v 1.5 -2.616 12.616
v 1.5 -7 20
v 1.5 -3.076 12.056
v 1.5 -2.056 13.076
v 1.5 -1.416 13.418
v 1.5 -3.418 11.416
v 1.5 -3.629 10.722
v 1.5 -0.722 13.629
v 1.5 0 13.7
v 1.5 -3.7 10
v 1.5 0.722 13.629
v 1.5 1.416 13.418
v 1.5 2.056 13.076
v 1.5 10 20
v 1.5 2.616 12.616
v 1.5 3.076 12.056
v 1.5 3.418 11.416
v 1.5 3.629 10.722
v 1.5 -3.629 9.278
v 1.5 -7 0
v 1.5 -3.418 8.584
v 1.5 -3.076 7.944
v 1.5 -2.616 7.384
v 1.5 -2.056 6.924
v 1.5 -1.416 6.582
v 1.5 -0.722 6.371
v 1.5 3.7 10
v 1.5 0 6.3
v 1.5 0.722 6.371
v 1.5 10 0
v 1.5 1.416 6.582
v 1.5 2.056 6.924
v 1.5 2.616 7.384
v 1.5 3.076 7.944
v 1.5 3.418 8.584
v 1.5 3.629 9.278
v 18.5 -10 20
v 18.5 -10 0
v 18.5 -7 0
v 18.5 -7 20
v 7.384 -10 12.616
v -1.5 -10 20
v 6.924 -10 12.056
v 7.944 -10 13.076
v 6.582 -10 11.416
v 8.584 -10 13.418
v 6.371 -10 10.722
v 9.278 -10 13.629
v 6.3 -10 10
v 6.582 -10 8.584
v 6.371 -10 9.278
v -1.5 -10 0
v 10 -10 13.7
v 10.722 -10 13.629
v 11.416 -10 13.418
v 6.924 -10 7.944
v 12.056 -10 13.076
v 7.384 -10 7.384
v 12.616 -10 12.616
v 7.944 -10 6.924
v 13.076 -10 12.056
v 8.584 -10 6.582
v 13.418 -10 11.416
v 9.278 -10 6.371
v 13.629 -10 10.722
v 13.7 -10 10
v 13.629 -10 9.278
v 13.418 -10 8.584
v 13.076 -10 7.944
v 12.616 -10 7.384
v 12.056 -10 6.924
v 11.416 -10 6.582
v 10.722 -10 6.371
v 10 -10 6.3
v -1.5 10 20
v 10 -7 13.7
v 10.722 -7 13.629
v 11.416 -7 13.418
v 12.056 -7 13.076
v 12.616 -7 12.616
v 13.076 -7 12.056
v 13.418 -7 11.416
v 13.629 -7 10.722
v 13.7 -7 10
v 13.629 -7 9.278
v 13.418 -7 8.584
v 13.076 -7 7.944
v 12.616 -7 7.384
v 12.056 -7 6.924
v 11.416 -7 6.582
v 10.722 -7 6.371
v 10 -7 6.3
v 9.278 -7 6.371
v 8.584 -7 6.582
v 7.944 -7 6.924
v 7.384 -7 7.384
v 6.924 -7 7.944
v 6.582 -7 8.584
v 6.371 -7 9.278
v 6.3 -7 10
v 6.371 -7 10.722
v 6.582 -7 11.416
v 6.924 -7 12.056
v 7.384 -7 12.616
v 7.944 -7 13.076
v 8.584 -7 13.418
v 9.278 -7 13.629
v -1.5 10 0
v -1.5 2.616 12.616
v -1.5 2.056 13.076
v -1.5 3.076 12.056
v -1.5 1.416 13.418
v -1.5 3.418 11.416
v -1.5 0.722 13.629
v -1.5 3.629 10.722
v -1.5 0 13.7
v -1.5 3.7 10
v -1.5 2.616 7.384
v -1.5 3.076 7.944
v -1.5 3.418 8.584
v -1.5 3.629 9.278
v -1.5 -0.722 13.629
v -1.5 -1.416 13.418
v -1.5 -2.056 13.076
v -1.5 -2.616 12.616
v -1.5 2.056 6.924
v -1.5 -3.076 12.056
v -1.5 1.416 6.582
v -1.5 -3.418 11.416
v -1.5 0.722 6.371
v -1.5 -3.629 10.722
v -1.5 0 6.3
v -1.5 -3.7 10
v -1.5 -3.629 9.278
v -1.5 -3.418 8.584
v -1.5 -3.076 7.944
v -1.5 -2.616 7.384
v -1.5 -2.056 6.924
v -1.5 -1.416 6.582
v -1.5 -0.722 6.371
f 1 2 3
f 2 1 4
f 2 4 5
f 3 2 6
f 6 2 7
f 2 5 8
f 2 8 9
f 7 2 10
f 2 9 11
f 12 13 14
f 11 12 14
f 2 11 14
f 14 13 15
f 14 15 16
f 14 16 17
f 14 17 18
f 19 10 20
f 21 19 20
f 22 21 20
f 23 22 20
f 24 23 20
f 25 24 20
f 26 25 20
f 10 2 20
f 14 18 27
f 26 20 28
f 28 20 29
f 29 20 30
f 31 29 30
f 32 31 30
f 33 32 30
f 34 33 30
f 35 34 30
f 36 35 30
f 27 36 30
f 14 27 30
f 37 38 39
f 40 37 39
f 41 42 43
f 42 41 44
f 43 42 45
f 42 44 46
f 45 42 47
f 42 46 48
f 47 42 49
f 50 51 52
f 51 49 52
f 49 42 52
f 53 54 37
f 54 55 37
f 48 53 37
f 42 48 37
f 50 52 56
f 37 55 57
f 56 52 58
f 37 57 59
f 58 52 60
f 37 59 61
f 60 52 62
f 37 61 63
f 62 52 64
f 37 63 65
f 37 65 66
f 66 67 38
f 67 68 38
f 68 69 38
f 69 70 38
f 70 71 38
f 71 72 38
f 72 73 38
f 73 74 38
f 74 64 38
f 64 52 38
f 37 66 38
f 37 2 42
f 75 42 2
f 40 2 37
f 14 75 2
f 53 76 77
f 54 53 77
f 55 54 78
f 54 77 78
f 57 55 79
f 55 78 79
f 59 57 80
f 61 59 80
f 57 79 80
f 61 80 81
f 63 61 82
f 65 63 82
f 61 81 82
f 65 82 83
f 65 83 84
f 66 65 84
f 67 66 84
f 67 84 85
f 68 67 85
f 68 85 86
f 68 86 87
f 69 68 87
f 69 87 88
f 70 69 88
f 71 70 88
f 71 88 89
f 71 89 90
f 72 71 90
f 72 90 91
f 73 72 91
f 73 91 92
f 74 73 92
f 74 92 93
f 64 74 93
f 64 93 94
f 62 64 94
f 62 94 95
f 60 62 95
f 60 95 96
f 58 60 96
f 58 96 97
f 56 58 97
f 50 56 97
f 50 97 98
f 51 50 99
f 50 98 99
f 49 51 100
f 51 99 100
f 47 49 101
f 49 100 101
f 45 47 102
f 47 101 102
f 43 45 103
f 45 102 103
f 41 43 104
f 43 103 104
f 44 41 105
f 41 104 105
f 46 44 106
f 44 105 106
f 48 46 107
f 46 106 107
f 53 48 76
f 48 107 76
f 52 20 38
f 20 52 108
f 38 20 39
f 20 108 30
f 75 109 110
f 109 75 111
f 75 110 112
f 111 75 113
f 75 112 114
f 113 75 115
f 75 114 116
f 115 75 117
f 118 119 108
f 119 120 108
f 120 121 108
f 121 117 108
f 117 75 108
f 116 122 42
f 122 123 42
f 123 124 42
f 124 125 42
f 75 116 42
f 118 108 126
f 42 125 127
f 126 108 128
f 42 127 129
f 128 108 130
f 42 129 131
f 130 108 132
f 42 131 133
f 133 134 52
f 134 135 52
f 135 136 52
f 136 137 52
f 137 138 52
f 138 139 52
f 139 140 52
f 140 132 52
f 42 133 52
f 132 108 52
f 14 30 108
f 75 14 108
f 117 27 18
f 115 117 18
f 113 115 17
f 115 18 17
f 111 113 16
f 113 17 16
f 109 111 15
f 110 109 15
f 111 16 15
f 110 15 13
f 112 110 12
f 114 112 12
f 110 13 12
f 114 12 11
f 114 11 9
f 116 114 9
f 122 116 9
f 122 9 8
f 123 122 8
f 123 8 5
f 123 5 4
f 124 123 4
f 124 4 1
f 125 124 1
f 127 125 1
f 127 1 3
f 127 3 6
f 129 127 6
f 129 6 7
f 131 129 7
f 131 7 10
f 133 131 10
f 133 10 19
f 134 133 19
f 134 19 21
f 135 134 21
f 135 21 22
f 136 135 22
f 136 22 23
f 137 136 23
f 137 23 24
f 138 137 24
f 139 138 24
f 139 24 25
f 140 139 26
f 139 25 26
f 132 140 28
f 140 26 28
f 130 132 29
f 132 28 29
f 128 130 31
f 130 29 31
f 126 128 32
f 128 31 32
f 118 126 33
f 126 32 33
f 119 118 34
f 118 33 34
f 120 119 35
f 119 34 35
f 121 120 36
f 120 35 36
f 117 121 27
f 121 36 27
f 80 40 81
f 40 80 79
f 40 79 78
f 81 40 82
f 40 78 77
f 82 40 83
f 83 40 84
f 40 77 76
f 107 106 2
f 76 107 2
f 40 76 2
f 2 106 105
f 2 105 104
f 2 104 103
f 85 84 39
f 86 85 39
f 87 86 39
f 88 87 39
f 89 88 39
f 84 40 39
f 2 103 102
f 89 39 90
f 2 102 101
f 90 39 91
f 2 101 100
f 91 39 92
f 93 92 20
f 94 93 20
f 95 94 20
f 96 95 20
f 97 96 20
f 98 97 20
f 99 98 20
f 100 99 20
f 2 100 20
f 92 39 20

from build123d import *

# Parameters (mm, degrees)
BOSS_EXTRUDE1_DEPTH = 20
SKETCH2_R           = 3.7
CUT_EXTRUDE1_DEPTH  = 20
SKETCH3_R           = 3.7
CUT_EXTRUDE2_DEPTH  = 20


with BuildPart() as part:
    # Sketch1 → Boss-Extrude1 (new body)
    with BuildSketch(Plane.XY):
        Polygon((1.5, -10), (18.5, -10), (18.5, -7), (1.5, -7), (1.5, 10), (-1.5, 10), (-1.5, -10), align=None)
    extrude(amount=BOSS_EXTRUDE1_DEPTH)

    # Sketch2 → Cut-Extrude1 (cut)
    with BuildSketch(Plane(origin=(0, -7, 0), x_dir=(1, 0, 0), z_dir=(0, 1, 0))):
        with Locations(Location((10, -10, 0), (0, 0, 270))):
            Circle(SKETCH2_R)
    extrude(amount=-CUT_EXTRUDE1_DEPTH, mode=Mode.SUBTRACT)

    # Sketch3 → Cut-Extrude2 (cut)
    with BuildSketch(Plane(origin=(1.5, 0, 0), x_dir=(0, 0, -1), z_dir=(1, 0, 0))):
        with Locations(Location((-10, 0, 0), (0, 0, 90))):
            Circle(SKETCH3_R)
    extrude(amount=-CUT_EXTRUDE2_DEPTH, mode=Mode.SUBTRACT)


solid = part.part
